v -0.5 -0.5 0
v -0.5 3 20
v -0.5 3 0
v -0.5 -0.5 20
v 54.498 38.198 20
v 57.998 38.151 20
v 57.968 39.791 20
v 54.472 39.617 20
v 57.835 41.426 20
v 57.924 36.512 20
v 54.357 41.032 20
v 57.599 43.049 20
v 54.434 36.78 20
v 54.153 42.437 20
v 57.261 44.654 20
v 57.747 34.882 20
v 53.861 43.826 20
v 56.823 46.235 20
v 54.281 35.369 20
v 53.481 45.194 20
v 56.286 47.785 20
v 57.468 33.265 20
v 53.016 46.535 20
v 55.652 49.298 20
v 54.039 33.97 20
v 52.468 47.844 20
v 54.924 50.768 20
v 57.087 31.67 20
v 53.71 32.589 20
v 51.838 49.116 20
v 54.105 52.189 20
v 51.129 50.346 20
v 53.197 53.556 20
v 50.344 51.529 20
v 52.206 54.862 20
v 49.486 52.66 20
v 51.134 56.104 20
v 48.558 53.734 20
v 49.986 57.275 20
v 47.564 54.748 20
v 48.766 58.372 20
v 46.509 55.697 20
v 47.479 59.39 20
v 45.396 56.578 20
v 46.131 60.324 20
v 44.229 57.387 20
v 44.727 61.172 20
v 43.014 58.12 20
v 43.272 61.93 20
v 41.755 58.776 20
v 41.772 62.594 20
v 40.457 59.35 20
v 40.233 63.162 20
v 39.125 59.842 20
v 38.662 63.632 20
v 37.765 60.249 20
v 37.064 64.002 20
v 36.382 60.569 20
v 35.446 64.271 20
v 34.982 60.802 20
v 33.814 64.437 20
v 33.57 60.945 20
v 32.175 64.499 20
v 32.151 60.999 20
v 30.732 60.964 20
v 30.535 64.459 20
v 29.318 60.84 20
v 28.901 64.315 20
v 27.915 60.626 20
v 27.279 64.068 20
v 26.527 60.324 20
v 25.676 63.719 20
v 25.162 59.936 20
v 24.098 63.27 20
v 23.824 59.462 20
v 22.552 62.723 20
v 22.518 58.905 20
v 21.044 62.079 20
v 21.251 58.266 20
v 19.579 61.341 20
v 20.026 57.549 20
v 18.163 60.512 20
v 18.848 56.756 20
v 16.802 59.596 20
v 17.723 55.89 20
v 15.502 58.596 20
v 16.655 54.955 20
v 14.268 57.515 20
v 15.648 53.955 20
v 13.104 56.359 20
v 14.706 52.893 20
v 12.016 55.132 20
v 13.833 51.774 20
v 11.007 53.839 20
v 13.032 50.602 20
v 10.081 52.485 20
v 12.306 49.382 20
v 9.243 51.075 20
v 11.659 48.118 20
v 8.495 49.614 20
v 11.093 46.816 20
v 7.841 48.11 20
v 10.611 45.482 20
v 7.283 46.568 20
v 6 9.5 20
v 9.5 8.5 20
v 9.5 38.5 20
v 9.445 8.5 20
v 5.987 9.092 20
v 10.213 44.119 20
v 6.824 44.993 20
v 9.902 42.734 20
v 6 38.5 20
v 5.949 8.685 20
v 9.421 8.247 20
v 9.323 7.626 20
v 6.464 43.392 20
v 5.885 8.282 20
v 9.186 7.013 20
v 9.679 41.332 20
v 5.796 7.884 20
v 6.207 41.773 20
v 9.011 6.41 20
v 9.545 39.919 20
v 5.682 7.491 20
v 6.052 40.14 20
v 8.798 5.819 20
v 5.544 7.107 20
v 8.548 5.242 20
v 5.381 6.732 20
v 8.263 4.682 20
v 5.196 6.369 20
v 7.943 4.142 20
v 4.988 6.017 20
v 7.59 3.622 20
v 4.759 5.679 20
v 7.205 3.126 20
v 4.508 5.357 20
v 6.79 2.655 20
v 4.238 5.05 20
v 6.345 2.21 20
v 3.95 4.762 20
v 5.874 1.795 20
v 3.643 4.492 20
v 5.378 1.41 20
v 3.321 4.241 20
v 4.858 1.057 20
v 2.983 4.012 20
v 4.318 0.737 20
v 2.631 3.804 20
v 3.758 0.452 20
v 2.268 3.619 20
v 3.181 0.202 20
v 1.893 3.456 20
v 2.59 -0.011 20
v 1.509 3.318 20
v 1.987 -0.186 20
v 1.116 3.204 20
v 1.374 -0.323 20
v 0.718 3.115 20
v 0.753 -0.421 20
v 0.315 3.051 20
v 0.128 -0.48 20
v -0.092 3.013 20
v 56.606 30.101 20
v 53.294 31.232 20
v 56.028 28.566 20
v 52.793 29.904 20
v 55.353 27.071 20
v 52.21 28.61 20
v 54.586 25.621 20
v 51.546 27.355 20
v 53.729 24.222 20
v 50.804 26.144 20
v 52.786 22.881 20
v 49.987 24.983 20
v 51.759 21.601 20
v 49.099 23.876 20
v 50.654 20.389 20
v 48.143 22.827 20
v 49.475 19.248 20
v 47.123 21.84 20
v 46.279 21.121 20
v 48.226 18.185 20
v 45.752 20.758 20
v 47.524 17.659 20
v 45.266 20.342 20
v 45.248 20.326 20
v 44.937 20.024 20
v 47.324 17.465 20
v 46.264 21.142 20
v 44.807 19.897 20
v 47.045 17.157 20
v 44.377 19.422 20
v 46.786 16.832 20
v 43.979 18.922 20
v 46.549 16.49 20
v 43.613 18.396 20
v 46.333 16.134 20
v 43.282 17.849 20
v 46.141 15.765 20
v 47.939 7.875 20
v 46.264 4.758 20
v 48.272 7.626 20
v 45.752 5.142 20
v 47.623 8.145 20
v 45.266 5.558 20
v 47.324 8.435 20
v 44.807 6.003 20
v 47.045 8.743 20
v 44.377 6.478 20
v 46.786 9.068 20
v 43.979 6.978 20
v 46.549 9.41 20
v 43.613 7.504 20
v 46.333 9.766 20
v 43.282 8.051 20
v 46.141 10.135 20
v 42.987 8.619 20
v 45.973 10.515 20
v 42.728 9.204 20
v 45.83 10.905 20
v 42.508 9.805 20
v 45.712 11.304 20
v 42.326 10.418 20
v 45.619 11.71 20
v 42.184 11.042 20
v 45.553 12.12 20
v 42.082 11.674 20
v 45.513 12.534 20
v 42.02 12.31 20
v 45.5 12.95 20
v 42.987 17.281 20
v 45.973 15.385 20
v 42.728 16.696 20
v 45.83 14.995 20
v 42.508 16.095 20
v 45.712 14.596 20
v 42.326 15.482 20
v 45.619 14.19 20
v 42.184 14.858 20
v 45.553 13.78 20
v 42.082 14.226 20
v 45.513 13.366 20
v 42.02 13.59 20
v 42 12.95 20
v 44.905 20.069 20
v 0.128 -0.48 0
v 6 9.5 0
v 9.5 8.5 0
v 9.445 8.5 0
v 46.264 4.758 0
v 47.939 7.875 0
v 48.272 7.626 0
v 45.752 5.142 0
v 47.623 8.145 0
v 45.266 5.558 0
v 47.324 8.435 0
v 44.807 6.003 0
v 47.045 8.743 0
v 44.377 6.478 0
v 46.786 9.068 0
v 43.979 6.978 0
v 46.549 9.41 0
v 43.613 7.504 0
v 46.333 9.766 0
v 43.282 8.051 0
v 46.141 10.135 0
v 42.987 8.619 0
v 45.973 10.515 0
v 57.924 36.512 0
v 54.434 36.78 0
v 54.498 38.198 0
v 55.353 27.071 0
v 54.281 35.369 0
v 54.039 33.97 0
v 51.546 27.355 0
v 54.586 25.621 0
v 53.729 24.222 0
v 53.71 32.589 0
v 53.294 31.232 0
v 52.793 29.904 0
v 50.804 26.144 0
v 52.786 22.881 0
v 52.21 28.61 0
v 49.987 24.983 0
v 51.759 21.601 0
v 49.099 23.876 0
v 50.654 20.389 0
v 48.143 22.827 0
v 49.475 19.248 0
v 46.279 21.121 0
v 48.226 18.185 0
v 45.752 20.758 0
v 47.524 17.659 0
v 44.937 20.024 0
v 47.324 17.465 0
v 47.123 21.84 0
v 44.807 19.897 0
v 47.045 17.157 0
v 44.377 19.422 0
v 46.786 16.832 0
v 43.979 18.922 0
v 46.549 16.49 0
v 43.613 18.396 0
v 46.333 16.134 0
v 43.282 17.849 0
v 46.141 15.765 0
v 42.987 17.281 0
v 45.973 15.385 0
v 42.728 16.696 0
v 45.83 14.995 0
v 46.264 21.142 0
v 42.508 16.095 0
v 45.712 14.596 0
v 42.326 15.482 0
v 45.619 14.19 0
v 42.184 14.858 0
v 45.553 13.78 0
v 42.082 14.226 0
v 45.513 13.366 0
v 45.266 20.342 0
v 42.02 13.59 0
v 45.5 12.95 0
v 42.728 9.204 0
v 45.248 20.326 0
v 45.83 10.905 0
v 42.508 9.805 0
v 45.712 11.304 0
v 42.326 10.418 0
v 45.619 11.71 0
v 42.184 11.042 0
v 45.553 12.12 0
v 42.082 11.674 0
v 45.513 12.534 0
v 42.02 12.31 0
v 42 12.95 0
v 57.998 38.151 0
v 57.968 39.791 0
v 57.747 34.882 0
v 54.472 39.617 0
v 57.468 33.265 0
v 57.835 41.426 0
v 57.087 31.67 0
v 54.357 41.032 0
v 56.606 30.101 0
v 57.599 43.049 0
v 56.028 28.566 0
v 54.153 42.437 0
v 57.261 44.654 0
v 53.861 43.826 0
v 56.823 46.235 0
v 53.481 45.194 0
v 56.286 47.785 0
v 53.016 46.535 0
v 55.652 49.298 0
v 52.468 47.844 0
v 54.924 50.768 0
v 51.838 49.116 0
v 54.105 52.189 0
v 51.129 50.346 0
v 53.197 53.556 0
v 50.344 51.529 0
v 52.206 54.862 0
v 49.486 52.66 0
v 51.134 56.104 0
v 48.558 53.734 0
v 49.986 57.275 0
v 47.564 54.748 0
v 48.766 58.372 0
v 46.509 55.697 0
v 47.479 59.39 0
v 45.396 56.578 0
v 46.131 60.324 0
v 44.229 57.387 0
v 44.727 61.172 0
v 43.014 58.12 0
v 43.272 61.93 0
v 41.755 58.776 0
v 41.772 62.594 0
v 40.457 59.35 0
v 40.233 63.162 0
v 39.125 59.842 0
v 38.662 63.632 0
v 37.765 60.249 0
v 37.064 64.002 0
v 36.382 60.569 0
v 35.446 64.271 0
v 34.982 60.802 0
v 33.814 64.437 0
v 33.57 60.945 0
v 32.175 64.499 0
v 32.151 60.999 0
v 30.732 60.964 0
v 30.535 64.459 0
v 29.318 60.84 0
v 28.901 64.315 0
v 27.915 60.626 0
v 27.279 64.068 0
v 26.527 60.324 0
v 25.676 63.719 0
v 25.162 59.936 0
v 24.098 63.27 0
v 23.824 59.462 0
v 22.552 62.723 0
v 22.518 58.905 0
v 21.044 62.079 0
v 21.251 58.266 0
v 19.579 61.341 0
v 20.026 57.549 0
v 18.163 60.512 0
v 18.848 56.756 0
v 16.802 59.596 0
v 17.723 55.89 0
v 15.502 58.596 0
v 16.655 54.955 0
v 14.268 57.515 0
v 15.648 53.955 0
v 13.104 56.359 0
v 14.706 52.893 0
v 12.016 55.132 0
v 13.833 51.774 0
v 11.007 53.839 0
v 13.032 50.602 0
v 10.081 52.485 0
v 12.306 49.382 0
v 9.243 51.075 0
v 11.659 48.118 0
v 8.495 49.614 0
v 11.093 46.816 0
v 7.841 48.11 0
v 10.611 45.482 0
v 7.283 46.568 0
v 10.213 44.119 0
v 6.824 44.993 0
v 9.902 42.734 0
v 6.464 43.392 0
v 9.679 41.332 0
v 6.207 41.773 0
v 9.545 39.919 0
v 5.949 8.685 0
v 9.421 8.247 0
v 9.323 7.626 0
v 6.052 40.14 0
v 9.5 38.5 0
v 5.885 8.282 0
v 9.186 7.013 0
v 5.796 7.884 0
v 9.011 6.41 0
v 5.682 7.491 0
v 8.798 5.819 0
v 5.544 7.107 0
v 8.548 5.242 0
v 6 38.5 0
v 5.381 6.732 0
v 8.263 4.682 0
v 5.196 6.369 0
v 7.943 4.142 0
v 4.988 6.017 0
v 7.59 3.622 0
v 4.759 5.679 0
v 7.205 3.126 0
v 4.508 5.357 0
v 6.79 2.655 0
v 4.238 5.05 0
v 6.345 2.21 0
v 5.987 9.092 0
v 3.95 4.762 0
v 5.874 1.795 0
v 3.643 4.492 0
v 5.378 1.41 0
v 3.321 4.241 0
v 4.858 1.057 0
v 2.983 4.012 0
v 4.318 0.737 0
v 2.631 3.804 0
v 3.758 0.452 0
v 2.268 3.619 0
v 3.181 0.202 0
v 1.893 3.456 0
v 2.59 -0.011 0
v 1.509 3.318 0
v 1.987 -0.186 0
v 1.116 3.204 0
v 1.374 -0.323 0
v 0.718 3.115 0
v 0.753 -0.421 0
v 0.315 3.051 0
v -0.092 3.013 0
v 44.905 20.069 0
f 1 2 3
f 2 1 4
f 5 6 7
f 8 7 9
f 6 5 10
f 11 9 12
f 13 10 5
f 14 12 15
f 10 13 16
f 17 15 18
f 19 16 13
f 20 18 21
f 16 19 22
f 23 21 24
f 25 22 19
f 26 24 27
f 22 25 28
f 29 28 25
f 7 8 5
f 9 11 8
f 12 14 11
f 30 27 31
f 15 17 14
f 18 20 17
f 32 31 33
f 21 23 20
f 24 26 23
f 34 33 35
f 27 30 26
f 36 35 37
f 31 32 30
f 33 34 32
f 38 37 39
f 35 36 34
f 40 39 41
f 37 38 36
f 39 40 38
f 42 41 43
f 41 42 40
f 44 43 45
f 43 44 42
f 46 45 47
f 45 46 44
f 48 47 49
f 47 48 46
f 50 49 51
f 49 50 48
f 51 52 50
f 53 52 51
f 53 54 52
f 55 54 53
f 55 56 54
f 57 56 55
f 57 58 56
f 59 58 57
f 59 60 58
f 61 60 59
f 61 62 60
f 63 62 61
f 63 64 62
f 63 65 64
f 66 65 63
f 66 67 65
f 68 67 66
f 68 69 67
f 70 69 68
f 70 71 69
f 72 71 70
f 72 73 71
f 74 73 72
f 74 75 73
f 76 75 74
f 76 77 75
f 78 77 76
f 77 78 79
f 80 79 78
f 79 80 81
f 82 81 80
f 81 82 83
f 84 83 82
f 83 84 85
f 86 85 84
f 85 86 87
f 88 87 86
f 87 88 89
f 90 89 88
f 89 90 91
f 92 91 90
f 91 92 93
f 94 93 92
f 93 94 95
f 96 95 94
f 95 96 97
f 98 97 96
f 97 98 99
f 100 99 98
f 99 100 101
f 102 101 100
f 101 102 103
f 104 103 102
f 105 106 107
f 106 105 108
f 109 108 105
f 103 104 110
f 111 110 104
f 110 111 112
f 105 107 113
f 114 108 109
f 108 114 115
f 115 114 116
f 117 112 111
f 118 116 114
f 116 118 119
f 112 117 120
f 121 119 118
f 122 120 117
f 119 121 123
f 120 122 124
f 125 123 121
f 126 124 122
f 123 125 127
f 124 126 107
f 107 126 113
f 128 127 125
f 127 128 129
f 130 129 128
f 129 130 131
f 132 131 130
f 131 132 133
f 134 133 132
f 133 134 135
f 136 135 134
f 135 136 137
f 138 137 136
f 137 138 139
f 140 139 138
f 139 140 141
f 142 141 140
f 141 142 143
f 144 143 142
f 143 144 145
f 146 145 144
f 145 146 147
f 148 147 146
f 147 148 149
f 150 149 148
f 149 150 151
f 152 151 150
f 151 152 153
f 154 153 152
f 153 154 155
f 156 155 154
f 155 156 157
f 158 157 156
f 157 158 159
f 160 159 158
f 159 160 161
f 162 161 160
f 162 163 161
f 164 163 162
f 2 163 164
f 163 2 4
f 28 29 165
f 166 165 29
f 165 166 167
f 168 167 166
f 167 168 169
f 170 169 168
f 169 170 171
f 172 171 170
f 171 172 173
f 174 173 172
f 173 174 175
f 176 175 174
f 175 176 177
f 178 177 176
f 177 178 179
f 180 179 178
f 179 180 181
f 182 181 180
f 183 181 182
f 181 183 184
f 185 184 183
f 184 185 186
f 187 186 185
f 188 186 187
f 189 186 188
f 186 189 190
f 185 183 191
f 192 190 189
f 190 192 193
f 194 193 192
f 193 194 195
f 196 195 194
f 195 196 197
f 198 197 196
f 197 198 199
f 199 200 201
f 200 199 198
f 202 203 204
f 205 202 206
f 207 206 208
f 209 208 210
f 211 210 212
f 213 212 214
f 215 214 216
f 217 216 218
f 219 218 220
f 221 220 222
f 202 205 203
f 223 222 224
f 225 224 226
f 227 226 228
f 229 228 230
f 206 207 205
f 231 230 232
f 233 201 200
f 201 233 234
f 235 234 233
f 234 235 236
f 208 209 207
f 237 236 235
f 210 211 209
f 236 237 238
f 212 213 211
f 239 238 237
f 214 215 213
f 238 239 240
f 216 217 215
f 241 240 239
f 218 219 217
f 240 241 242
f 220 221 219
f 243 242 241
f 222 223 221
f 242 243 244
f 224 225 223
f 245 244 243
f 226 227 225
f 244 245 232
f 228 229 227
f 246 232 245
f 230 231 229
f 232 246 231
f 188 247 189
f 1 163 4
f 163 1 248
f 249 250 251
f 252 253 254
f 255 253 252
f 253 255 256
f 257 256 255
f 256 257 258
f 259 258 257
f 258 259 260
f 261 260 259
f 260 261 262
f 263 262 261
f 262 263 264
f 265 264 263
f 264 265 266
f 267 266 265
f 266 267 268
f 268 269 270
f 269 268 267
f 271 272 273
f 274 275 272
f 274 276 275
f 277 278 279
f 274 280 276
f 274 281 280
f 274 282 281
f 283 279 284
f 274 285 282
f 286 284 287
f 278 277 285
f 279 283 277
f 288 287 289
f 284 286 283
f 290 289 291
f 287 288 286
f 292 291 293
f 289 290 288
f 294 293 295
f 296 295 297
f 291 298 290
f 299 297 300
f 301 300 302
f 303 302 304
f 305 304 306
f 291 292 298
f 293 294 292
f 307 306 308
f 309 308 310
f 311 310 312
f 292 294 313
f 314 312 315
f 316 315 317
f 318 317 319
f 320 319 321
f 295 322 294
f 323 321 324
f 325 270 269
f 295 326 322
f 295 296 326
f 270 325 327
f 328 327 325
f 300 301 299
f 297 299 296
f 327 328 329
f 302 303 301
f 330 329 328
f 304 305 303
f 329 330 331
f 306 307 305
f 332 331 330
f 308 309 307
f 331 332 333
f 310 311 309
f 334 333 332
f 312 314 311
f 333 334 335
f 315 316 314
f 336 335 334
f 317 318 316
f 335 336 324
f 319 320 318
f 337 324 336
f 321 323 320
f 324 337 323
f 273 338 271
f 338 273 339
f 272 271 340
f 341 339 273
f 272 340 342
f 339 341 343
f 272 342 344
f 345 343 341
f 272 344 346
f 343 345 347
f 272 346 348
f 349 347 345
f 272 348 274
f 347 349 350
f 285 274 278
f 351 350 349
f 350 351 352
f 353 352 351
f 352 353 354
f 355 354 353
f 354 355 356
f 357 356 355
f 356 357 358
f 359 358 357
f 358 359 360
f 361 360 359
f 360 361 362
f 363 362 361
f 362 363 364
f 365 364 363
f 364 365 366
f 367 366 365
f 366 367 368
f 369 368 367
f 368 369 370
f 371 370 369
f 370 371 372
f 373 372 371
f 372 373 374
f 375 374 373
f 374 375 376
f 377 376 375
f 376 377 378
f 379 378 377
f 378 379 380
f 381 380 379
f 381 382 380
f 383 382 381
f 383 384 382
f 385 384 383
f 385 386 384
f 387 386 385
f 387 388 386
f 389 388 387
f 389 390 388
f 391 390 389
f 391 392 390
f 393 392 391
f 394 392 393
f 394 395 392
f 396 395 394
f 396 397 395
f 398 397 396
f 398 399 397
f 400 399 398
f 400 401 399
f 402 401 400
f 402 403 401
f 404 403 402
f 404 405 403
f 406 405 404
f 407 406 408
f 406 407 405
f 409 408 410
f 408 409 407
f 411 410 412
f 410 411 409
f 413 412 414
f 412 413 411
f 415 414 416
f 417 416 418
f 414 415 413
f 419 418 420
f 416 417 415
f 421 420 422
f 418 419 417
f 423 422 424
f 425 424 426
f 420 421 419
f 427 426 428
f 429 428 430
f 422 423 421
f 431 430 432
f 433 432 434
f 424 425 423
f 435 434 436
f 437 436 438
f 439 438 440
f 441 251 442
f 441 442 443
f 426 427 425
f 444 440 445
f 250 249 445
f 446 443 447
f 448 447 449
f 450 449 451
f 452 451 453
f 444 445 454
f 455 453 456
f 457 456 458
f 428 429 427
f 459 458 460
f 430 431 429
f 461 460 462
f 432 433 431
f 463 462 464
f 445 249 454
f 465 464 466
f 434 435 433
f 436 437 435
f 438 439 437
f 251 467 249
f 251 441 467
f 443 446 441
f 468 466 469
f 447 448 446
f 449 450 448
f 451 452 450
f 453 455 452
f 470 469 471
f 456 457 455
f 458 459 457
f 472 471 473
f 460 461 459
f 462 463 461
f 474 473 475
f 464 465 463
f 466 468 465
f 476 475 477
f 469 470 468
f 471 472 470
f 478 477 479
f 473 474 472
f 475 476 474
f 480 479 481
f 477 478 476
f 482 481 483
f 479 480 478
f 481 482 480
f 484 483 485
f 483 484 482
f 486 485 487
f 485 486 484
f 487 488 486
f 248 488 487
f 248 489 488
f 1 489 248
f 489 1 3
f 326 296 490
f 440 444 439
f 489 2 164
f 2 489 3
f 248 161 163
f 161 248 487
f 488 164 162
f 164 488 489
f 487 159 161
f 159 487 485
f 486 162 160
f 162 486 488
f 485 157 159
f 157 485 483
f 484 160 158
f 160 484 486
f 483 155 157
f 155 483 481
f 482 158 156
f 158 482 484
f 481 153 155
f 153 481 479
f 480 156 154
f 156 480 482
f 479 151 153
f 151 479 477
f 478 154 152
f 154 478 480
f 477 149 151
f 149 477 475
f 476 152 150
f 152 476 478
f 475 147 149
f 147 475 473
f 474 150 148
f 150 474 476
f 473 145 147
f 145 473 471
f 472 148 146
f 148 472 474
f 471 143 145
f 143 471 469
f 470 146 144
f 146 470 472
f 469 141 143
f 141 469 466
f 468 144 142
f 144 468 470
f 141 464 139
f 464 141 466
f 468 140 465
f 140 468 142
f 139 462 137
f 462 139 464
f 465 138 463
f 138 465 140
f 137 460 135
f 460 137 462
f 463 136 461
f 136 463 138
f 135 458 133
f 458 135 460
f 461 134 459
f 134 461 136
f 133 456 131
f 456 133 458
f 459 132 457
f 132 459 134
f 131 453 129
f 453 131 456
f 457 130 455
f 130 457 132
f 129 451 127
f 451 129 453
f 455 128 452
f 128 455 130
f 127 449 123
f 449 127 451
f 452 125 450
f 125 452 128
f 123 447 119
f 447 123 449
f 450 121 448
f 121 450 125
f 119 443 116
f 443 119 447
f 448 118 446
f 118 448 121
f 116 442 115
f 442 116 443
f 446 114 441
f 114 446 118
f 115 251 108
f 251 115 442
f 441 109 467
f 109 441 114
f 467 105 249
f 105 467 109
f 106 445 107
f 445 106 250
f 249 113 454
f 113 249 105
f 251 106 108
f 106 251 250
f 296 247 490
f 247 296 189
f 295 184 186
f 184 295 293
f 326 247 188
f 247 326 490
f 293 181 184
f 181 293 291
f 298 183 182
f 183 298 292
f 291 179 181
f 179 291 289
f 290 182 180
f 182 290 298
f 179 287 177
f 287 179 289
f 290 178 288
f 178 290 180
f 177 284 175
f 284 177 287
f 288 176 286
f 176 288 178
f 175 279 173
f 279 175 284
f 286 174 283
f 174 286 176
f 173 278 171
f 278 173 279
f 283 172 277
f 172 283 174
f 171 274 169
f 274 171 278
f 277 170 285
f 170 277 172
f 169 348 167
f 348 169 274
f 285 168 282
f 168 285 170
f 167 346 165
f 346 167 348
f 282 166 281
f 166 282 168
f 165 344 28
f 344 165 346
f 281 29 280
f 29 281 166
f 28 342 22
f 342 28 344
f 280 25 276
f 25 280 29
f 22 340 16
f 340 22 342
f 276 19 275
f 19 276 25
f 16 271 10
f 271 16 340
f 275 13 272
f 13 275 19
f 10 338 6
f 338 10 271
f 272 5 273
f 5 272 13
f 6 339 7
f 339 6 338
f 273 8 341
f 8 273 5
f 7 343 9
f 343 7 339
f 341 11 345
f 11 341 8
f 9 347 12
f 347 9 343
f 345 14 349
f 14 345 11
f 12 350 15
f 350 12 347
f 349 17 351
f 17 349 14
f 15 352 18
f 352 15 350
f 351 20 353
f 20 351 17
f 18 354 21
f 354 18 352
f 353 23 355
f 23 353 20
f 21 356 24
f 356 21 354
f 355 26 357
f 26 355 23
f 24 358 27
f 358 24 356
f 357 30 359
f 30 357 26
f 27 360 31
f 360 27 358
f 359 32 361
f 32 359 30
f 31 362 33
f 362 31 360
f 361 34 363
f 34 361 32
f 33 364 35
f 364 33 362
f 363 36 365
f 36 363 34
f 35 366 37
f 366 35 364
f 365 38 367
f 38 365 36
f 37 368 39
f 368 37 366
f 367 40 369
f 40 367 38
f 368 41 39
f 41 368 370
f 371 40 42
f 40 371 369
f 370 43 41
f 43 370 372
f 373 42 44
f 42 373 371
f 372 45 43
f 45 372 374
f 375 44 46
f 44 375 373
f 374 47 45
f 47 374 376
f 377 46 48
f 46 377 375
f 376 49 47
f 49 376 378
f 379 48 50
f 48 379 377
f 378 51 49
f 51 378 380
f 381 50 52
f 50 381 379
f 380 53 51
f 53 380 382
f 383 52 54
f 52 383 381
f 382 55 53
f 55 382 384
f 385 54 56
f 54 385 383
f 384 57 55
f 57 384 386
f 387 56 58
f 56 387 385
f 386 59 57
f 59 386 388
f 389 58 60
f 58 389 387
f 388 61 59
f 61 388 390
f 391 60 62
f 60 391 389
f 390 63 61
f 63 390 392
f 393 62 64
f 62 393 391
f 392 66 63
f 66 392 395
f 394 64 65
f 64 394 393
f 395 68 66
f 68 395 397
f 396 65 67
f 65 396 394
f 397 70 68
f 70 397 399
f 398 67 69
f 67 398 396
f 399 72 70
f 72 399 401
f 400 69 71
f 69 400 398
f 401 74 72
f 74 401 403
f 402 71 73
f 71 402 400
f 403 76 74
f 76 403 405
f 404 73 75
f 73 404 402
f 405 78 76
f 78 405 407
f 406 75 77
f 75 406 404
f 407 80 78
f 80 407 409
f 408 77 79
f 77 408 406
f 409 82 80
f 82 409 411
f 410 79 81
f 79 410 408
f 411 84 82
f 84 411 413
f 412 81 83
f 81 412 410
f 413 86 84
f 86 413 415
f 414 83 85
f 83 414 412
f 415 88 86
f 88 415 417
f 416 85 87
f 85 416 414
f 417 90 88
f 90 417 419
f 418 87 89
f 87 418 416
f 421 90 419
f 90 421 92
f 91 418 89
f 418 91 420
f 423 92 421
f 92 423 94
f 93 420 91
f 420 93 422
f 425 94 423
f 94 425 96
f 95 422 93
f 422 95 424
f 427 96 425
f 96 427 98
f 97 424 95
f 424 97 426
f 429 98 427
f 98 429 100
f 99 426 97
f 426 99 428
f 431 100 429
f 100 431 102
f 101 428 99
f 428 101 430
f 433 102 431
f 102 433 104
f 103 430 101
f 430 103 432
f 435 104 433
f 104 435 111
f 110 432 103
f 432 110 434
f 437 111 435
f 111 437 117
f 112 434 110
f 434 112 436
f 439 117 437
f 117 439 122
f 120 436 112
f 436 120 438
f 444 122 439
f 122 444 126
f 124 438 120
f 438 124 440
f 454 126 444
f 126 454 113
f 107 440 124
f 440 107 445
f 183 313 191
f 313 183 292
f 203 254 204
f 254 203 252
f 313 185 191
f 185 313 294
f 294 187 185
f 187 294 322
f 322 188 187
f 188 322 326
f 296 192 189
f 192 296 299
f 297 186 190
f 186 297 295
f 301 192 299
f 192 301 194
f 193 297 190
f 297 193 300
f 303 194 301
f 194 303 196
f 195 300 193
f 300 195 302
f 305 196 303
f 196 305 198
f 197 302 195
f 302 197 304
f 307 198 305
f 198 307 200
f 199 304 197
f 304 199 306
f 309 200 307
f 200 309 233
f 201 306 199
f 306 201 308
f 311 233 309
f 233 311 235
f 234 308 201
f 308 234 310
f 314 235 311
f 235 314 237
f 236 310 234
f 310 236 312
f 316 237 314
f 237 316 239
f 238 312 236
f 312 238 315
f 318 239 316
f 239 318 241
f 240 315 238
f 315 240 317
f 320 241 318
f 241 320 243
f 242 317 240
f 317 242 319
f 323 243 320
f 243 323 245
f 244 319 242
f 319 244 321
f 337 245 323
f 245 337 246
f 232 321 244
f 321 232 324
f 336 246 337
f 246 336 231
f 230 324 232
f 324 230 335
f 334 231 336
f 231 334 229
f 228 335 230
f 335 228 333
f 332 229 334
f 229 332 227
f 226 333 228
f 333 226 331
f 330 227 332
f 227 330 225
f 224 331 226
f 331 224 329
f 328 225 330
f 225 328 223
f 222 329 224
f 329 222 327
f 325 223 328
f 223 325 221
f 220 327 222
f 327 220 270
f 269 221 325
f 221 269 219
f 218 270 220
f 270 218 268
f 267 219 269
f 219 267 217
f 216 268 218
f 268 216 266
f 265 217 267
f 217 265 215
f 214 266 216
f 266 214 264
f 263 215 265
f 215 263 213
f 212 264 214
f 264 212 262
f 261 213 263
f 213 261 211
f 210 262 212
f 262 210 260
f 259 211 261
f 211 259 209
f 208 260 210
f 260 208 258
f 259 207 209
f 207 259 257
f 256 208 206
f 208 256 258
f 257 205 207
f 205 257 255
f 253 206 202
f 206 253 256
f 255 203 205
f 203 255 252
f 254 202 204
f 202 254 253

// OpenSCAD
$fn=100;

width=20;
thick=3.5;

union() {

    translate([-0.5,9.5,0])
    rotate([0,0,-90]) 
    rotate_extrude(angle = 90, convexity = 20)
        translate([6.5,0]) square([thick,width]);

    translate([6,8.5,0])
        cube([thick,30,20]);
        
    translate([32,38.5,0])
    rotate([0,0,-90+35]) 
    rotate_extrude(angle = 235, convexity = 20)
        translate([45/2,0]) square([thick,width]);
        
    translate([52,12.95,0])
    rotate([0,0,90+35]) 
    rotate_extrude(angle = 110, convexity = 20)
        translate([6.5,0]) square([thick,width]);
}
